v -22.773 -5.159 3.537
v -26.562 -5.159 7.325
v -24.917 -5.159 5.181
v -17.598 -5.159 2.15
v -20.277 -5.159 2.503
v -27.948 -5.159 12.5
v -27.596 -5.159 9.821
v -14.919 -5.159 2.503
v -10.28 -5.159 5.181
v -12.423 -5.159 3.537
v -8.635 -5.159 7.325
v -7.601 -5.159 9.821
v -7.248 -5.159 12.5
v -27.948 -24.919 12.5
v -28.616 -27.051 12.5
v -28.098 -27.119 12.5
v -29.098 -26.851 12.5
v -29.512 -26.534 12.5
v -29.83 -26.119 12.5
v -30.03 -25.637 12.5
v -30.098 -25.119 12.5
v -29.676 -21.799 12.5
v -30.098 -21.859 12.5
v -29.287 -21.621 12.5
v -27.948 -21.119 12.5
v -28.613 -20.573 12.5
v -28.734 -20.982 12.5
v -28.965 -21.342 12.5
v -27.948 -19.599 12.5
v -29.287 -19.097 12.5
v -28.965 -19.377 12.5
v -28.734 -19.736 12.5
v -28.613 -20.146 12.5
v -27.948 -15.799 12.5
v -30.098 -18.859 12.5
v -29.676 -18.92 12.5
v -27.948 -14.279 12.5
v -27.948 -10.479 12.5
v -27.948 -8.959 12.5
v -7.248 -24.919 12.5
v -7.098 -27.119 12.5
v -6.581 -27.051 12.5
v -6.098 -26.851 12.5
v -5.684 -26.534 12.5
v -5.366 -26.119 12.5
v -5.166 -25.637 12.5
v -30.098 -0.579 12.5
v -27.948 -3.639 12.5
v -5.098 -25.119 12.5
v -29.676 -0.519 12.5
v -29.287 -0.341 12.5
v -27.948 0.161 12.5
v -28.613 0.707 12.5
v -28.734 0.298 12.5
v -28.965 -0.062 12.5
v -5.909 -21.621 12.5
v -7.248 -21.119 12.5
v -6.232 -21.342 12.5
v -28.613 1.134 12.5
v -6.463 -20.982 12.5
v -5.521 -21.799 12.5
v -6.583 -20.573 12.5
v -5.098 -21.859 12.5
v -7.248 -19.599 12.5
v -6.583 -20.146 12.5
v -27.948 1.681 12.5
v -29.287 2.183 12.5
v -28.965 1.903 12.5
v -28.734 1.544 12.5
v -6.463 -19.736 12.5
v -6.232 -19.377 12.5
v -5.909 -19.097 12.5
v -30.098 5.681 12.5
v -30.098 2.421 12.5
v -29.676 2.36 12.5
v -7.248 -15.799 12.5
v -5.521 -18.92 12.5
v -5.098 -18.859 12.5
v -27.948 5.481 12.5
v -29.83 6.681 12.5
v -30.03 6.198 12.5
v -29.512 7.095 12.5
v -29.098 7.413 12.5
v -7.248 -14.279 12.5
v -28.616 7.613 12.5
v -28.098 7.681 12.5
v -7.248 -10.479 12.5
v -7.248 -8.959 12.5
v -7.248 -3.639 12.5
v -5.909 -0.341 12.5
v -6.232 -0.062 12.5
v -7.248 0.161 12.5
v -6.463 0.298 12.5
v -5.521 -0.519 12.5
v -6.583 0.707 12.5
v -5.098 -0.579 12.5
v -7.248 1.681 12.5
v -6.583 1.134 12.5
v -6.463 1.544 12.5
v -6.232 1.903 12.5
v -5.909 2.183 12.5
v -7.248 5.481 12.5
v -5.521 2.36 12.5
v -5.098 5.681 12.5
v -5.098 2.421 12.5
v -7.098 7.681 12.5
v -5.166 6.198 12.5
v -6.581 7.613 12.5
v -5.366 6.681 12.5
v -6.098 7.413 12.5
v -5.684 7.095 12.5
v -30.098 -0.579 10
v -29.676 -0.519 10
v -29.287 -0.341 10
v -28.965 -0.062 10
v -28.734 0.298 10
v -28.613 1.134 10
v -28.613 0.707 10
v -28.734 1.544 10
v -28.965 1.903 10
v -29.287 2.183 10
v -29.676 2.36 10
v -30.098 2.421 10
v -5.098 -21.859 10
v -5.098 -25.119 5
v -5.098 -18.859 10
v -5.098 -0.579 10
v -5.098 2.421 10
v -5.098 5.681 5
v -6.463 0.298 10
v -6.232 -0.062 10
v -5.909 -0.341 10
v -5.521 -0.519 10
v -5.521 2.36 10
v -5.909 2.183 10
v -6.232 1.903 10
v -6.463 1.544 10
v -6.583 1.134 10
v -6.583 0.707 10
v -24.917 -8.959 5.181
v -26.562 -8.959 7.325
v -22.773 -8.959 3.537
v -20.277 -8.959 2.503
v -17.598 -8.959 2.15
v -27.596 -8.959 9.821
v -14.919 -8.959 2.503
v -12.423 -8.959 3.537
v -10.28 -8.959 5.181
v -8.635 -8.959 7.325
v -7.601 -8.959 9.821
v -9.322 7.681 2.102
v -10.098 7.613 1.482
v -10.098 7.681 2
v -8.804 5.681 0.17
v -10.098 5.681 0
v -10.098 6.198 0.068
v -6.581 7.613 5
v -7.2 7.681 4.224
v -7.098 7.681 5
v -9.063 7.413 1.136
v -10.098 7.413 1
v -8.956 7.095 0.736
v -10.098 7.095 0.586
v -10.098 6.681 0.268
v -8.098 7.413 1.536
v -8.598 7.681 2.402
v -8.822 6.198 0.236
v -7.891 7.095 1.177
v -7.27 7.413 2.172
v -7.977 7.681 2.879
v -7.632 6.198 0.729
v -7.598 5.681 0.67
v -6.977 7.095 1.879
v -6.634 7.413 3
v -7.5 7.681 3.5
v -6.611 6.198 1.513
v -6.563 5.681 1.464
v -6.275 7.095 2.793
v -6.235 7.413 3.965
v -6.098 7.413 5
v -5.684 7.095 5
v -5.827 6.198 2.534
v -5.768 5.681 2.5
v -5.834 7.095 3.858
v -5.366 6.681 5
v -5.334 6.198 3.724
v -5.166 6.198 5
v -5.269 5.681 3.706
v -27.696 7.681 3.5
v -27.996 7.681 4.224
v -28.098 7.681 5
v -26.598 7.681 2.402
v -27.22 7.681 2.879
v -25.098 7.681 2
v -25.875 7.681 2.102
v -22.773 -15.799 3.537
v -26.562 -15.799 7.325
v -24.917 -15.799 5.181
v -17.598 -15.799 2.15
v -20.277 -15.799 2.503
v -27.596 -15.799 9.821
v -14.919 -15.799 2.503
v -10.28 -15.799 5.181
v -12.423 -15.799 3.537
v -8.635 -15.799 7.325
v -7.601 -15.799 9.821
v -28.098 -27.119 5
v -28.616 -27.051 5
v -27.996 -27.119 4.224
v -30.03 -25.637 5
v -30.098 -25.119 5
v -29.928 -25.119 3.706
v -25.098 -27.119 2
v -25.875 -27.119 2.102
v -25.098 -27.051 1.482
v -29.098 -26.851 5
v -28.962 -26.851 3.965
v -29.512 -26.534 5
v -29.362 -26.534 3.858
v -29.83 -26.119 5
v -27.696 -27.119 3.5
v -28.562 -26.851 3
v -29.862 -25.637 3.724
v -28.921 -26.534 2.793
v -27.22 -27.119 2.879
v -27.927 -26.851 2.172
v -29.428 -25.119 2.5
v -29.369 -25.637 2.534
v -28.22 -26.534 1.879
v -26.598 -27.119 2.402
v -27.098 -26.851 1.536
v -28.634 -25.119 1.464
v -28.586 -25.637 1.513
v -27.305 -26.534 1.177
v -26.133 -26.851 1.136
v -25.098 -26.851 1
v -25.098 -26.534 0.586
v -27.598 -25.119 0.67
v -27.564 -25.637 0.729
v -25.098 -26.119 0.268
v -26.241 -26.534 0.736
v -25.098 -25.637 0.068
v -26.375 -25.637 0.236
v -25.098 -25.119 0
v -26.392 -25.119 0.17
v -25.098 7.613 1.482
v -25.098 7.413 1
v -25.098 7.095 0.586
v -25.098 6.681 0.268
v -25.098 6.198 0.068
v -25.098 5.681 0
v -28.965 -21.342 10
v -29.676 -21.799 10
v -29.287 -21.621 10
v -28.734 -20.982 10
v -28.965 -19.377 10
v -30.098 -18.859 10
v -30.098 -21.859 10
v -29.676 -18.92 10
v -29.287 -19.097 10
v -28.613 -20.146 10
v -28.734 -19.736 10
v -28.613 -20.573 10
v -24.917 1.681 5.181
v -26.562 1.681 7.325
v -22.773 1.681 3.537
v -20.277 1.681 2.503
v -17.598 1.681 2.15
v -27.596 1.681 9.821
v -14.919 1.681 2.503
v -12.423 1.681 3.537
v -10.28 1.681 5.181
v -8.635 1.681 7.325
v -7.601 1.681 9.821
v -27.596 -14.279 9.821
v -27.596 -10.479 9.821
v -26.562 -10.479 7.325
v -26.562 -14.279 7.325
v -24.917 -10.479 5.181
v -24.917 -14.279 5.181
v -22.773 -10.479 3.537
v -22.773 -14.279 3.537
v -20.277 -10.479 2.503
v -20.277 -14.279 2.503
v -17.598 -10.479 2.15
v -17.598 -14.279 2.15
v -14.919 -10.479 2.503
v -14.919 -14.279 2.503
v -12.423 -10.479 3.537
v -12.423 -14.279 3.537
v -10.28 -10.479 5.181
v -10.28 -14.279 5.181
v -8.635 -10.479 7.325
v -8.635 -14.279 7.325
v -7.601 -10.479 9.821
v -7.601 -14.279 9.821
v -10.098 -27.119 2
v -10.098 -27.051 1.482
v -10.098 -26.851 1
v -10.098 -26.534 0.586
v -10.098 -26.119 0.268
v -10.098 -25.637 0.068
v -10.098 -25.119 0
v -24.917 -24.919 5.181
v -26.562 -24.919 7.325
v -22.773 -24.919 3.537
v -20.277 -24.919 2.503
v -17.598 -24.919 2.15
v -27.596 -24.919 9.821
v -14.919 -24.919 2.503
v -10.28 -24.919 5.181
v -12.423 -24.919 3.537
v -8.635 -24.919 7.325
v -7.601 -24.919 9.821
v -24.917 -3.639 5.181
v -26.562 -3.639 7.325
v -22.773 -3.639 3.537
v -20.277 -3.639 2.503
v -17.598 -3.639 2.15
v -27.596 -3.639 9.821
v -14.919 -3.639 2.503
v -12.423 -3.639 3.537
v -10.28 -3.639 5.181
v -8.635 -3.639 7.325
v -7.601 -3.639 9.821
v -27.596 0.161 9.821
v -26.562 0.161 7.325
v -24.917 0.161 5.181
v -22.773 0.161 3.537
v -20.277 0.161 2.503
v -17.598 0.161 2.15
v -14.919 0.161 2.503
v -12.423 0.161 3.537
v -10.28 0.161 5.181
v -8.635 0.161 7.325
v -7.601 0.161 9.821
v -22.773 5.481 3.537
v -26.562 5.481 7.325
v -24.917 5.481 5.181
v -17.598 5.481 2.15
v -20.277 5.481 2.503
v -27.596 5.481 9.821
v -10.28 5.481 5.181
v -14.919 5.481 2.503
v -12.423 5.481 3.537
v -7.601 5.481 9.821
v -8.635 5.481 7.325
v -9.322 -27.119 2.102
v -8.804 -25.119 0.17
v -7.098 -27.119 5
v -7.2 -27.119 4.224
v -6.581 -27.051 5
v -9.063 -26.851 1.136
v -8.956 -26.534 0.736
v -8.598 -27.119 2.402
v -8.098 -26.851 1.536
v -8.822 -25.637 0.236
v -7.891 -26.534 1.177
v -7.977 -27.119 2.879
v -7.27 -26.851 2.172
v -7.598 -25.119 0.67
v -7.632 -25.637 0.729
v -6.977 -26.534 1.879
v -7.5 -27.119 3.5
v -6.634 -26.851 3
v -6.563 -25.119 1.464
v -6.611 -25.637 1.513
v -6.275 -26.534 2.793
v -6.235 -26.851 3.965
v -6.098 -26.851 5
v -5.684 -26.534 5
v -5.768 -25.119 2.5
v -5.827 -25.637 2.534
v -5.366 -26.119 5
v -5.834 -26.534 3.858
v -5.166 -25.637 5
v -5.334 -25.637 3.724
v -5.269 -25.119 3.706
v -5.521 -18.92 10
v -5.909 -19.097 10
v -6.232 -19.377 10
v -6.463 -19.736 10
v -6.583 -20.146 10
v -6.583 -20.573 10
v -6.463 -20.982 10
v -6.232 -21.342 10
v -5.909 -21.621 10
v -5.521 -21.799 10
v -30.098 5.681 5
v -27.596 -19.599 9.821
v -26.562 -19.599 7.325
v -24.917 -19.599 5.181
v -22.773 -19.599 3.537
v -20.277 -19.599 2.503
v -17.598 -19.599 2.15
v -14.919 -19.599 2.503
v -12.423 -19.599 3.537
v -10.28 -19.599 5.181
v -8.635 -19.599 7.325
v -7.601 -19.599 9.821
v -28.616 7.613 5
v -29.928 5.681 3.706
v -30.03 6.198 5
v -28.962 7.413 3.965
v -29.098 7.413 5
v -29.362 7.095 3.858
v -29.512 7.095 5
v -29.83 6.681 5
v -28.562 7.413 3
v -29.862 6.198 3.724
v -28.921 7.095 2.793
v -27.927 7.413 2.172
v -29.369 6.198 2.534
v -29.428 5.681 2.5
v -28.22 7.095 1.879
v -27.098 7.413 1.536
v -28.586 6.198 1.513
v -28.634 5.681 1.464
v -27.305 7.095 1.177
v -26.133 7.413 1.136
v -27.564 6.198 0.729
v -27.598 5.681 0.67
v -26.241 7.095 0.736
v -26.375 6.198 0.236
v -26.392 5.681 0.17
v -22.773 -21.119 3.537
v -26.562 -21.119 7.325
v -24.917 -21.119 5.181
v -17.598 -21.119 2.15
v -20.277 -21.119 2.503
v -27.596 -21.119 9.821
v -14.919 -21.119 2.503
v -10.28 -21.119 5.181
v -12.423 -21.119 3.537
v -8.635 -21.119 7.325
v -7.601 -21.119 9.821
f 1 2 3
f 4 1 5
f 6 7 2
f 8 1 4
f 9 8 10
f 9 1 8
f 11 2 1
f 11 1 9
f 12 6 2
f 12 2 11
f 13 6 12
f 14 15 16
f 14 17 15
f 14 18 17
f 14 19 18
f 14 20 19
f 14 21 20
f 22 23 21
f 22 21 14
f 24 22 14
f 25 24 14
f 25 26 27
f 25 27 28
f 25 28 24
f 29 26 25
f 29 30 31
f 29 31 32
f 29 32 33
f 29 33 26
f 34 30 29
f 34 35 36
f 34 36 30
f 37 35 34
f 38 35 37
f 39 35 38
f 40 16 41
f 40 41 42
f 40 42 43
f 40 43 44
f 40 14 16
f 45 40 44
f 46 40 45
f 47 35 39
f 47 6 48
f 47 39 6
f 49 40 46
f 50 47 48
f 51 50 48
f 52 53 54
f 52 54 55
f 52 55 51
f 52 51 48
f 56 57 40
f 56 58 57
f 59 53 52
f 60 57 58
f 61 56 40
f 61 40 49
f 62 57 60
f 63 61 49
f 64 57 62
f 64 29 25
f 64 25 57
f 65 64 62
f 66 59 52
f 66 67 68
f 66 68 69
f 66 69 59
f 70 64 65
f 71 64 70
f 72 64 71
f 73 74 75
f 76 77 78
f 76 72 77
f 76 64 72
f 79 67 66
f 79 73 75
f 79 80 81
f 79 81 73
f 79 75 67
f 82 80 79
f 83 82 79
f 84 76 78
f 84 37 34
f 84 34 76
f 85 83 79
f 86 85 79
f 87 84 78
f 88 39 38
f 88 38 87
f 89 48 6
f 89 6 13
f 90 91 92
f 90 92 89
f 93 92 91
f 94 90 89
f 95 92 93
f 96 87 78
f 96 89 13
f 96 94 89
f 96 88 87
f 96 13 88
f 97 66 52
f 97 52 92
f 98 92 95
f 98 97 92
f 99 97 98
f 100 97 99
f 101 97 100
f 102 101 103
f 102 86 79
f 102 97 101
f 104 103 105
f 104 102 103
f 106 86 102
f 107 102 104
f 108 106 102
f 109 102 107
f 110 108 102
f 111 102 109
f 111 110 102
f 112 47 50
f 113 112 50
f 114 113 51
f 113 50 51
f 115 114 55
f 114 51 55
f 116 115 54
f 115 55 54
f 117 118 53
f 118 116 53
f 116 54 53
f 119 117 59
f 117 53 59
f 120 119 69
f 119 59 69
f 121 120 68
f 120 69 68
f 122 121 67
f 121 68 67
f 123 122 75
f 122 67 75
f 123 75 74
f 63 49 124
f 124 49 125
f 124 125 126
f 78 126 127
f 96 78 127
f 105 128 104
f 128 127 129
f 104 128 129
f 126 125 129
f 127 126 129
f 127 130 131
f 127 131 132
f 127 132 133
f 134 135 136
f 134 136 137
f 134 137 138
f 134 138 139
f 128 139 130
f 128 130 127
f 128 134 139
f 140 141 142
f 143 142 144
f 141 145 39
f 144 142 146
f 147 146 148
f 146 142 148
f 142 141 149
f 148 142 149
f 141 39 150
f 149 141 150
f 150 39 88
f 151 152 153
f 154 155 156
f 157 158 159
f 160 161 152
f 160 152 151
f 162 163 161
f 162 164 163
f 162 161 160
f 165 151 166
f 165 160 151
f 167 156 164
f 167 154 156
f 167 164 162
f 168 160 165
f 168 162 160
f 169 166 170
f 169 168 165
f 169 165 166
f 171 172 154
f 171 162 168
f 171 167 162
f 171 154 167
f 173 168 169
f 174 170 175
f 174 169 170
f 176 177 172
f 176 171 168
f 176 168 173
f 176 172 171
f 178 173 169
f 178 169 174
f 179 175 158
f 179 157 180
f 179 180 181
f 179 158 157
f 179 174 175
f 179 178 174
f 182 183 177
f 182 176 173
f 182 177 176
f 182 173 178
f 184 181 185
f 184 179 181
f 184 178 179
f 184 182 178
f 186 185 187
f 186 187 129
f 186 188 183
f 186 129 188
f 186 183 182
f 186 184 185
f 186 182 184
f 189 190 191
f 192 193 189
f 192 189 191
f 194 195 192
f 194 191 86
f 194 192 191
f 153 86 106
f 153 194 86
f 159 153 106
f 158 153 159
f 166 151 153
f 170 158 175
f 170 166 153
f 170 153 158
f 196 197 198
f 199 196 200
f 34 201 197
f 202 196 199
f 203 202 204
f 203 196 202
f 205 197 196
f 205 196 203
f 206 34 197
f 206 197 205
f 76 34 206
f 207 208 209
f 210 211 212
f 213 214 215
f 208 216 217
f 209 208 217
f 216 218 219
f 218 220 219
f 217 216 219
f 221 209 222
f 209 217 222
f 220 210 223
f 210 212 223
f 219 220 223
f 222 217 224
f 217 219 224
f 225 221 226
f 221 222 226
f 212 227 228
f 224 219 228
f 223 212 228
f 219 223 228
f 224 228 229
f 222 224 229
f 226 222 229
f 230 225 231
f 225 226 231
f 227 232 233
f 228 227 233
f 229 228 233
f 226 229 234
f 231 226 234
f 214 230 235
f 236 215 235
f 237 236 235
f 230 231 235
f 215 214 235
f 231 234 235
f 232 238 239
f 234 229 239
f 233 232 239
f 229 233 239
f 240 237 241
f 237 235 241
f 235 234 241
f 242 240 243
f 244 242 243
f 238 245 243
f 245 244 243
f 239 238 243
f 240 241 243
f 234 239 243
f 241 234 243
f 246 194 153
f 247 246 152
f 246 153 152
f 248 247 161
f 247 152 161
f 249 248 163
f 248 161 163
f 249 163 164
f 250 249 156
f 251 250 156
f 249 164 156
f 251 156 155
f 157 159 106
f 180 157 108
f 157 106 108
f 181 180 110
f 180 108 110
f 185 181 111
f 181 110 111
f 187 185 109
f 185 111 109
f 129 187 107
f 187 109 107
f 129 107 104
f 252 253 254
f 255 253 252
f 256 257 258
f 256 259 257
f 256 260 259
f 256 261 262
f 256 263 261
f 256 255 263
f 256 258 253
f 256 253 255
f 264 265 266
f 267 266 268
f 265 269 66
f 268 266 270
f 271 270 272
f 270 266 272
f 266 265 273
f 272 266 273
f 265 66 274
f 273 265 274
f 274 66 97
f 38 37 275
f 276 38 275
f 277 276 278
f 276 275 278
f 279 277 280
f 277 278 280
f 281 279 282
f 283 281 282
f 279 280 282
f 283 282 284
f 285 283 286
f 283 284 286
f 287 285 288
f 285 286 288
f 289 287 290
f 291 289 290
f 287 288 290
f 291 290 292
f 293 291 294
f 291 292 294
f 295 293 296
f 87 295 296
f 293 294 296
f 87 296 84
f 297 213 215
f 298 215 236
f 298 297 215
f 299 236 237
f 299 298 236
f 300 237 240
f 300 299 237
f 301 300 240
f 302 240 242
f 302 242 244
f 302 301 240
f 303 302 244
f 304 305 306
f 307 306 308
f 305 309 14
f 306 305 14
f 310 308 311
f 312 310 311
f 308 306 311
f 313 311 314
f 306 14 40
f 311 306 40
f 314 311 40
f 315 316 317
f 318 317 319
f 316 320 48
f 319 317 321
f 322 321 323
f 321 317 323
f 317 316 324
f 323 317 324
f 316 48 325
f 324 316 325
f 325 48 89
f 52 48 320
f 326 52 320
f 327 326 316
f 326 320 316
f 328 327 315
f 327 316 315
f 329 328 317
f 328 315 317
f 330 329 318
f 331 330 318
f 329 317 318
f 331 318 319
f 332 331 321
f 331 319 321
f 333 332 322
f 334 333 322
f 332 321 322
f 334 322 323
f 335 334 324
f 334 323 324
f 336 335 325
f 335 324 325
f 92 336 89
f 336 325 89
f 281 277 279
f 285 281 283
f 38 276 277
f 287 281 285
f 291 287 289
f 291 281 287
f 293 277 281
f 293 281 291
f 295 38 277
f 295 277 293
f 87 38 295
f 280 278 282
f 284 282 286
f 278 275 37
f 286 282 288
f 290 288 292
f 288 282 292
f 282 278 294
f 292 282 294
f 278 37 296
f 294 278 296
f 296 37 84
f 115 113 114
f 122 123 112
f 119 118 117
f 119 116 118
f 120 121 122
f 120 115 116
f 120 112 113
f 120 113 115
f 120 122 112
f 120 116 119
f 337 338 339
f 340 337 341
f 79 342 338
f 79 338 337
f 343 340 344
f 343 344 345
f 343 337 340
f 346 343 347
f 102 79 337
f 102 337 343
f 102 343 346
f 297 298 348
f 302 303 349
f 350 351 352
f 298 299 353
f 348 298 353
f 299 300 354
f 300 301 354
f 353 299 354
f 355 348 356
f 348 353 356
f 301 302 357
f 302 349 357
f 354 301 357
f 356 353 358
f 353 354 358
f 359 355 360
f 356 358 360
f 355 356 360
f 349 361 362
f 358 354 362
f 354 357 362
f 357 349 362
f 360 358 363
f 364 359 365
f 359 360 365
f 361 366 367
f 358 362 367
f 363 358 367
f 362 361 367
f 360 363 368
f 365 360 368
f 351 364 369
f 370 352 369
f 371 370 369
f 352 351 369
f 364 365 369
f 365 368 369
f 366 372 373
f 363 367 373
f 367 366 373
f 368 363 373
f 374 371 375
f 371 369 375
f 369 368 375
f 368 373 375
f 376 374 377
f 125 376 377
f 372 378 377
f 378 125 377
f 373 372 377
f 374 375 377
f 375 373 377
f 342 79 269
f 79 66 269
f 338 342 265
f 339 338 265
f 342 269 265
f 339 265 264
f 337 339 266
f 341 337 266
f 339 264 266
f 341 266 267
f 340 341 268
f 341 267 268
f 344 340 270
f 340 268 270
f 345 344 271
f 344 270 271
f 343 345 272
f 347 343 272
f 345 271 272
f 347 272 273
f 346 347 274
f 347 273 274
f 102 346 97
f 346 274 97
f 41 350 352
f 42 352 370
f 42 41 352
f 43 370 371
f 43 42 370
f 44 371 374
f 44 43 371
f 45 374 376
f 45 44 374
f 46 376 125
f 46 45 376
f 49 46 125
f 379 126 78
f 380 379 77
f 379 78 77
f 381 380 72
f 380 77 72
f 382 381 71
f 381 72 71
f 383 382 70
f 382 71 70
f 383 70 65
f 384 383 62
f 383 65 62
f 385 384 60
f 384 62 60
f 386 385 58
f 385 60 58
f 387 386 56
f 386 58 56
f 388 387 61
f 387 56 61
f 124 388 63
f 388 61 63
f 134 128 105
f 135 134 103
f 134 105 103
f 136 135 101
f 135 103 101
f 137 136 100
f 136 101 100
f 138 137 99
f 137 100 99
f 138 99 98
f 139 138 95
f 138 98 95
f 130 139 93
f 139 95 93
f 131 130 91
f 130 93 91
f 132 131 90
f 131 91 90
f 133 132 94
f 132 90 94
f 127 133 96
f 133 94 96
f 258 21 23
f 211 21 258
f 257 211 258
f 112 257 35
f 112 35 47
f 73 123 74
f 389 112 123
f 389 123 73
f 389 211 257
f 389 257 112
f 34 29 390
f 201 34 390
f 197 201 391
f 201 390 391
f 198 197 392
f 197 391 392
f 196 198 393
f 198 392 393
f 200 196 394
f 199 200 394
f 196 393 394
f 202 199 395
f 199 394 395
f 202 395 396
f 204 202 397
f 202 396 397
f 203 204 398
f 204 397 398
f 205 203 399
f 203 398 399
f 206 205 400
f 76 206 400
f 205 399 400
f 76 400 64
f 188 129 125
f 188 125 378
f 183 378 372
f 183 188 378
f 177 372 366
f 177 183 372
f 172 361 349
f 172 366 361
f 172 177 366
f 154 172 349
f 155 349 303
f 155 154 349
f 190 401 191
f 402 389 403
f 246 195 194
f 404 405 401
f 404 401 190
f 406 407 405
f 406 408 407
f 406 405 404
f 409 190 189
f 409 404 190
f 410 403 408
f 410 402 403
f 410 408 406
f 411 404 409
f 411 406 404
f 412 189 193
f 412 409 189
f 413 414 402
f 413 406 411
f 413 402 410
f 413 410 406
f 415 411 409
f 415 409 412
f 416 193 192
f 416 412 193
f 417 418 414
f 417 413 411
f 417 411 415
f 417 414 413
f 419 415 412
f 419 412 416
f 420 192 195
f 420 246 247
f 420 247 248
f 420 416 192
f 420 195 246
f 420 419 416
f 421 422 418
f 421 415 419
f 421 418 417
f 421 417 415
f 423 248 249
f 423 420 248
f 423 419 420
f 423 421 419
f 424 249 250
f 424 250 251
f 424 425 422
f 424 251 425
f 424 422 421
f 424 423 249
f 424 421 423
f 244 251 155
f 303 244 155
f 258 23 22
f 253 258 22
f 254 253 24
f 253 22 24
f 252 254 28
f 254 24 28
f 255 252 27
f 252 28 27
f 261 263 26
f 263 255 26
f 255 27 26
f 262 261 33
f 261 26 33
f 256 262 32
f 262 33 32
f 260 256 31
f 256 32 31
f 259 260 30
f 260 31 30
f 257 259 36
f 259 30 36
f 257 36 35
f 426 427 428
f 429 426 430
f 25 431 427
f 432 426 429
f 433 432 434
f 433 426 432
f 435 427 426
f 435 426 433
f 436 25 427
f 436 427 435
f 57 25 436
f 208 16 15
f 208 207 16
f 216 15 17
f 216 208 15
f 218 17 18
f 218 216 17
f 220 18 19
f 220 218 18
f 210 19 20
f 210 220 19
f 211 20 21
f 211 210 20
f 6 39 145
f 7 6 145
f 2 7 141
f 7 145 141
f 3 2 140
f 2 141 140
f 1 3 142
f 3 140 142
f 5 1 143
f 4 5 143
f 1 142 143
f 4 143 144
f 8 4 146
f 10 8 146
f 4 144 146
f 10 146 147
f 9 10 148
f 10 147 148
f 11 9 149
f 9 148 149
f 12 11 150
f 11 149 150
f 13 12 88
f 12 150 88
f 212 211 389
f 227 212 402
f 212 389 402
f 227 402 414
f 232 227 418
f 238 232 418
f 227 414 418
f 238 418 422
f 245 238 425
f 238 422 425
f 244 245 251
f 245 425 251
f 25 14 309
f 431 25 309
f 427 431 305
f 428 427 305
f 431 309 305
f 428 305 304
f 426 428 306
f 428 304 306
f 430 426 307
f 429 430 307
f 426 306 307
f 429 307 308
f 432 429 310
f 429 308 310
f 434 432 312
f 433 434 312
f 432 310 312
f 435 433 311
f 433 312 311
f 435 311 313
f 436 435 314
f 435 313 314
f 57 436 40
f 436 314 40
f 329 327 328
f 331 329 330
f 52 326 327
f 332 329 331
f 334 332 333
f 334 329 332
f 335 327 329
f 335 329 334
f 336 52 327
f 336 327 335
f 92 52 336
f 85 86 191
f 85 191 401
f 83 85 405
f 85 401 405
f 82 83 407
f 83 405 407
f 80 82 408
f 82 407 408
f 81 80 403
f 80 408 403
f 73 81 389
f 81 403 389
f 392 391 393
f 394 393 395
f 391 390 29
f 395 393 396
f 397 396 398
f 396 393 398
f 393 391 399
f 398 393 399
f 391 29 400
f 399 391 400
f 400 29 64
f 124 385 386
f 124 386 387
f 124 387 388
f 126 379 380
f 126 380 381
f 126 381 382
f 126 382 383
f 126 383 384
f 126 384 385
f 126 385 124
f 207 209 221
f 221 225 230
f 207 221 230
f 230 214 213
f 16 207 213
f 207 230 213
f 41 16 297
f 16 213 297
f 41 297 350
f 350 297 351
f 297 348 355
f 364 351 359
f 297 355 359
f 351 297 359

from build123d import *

# Parameters (mm, degrees)
F0_W     = 25
F0_H     = 34.8
F1_DEPTH = 12.5
F3_START = -2.2
F2_R     = 10.35
F3_DEPTH = 30.4
F4_W     = 20.7
F4_H     = 1.52
F5_DEPTH = 10.6
F6_R     = 5
F7_R     = 2
F8_R     = 1.5
F9_DEPTH = 2.5


with BuildPart() as f1:
    # F0 (on Top) → F1 (new body)
    with BuildSketch(Plane.XY):
        with Locations((-17.5982150249, -9.7193448131)):
            Rectangle(F0_W, F0_H)
    extrude(amount=F1_DEPTH)

    # F2 (on face) → F3 (cut)
    with BuildSketch(Plane.XZ.offset(27.1193448131).offset(F3_START)):
        with Locations((-17.5982150249, 12.5)):
            Circle(F2_R)
    extrude(amount=-F3_DEPTH, mode=Mode.SUBTRACT)

    # F4 (on face) → F5 (join)
    with BuildSketch(Plane.XY.offset(12.5)):
        with Locations((-17.5982150249, 0.9206551869)):
            Rectangle(F4_W, F4_H)
        with Locations((-17.5982150249, -4.3993448131)):
            Rectangle(F4_W, F4_H)
        with Locations((-17.5982150249, -9.7193448131)):
            Rectangle(F4_W, F4_H)
        with Locations((-17.5982150249, -15.0393448131)):
            Rectangle(F4_W, F4_H)
        with Locations((-17.5982150249, -20.3593448131)):
            Rectangle(F4_W, F4_H)
    extrude(amount=-F5_DEPTH)

    # F6
    f6_edges = [f1.edges().sort_by_distance(p)[0] for p in [
        (-5.098215, -9.719345, 0),
        (-30.098215, -9.719345, 0),
    ]]
    fillet(f6_edges, radius=F6_R)

    # F7
    f7_edges = [f1.edges().sort_by_distance(p)[0] for p in [
        (-5.098215, -27.119345, 8.75),
        (-5.098215, 7.680655, 8.75),
    ]]
    fillet(f7_edges, radius=F7_R)

    # F8 (on face) → F9 (cut)
    with BuildSketch(Plane.XY.offset(12.5)):
        with Locations((-30.0982150249, 0.9206551869)):
            Circle(F8_R)
        with Locations((-5.0982150249, 0.9206551869)):
            Circle(F8_R)
        with Locations((-5.0982150249, -20.3593448131)):
            Circle(F8_R)
        with Locations((-30.0982150249, -20.3593448131)):
            Circle(F8_R)
    extrude(amount=-F9_DEPTH, mode=Mode.SUBTRACT)


solid = f1.part
